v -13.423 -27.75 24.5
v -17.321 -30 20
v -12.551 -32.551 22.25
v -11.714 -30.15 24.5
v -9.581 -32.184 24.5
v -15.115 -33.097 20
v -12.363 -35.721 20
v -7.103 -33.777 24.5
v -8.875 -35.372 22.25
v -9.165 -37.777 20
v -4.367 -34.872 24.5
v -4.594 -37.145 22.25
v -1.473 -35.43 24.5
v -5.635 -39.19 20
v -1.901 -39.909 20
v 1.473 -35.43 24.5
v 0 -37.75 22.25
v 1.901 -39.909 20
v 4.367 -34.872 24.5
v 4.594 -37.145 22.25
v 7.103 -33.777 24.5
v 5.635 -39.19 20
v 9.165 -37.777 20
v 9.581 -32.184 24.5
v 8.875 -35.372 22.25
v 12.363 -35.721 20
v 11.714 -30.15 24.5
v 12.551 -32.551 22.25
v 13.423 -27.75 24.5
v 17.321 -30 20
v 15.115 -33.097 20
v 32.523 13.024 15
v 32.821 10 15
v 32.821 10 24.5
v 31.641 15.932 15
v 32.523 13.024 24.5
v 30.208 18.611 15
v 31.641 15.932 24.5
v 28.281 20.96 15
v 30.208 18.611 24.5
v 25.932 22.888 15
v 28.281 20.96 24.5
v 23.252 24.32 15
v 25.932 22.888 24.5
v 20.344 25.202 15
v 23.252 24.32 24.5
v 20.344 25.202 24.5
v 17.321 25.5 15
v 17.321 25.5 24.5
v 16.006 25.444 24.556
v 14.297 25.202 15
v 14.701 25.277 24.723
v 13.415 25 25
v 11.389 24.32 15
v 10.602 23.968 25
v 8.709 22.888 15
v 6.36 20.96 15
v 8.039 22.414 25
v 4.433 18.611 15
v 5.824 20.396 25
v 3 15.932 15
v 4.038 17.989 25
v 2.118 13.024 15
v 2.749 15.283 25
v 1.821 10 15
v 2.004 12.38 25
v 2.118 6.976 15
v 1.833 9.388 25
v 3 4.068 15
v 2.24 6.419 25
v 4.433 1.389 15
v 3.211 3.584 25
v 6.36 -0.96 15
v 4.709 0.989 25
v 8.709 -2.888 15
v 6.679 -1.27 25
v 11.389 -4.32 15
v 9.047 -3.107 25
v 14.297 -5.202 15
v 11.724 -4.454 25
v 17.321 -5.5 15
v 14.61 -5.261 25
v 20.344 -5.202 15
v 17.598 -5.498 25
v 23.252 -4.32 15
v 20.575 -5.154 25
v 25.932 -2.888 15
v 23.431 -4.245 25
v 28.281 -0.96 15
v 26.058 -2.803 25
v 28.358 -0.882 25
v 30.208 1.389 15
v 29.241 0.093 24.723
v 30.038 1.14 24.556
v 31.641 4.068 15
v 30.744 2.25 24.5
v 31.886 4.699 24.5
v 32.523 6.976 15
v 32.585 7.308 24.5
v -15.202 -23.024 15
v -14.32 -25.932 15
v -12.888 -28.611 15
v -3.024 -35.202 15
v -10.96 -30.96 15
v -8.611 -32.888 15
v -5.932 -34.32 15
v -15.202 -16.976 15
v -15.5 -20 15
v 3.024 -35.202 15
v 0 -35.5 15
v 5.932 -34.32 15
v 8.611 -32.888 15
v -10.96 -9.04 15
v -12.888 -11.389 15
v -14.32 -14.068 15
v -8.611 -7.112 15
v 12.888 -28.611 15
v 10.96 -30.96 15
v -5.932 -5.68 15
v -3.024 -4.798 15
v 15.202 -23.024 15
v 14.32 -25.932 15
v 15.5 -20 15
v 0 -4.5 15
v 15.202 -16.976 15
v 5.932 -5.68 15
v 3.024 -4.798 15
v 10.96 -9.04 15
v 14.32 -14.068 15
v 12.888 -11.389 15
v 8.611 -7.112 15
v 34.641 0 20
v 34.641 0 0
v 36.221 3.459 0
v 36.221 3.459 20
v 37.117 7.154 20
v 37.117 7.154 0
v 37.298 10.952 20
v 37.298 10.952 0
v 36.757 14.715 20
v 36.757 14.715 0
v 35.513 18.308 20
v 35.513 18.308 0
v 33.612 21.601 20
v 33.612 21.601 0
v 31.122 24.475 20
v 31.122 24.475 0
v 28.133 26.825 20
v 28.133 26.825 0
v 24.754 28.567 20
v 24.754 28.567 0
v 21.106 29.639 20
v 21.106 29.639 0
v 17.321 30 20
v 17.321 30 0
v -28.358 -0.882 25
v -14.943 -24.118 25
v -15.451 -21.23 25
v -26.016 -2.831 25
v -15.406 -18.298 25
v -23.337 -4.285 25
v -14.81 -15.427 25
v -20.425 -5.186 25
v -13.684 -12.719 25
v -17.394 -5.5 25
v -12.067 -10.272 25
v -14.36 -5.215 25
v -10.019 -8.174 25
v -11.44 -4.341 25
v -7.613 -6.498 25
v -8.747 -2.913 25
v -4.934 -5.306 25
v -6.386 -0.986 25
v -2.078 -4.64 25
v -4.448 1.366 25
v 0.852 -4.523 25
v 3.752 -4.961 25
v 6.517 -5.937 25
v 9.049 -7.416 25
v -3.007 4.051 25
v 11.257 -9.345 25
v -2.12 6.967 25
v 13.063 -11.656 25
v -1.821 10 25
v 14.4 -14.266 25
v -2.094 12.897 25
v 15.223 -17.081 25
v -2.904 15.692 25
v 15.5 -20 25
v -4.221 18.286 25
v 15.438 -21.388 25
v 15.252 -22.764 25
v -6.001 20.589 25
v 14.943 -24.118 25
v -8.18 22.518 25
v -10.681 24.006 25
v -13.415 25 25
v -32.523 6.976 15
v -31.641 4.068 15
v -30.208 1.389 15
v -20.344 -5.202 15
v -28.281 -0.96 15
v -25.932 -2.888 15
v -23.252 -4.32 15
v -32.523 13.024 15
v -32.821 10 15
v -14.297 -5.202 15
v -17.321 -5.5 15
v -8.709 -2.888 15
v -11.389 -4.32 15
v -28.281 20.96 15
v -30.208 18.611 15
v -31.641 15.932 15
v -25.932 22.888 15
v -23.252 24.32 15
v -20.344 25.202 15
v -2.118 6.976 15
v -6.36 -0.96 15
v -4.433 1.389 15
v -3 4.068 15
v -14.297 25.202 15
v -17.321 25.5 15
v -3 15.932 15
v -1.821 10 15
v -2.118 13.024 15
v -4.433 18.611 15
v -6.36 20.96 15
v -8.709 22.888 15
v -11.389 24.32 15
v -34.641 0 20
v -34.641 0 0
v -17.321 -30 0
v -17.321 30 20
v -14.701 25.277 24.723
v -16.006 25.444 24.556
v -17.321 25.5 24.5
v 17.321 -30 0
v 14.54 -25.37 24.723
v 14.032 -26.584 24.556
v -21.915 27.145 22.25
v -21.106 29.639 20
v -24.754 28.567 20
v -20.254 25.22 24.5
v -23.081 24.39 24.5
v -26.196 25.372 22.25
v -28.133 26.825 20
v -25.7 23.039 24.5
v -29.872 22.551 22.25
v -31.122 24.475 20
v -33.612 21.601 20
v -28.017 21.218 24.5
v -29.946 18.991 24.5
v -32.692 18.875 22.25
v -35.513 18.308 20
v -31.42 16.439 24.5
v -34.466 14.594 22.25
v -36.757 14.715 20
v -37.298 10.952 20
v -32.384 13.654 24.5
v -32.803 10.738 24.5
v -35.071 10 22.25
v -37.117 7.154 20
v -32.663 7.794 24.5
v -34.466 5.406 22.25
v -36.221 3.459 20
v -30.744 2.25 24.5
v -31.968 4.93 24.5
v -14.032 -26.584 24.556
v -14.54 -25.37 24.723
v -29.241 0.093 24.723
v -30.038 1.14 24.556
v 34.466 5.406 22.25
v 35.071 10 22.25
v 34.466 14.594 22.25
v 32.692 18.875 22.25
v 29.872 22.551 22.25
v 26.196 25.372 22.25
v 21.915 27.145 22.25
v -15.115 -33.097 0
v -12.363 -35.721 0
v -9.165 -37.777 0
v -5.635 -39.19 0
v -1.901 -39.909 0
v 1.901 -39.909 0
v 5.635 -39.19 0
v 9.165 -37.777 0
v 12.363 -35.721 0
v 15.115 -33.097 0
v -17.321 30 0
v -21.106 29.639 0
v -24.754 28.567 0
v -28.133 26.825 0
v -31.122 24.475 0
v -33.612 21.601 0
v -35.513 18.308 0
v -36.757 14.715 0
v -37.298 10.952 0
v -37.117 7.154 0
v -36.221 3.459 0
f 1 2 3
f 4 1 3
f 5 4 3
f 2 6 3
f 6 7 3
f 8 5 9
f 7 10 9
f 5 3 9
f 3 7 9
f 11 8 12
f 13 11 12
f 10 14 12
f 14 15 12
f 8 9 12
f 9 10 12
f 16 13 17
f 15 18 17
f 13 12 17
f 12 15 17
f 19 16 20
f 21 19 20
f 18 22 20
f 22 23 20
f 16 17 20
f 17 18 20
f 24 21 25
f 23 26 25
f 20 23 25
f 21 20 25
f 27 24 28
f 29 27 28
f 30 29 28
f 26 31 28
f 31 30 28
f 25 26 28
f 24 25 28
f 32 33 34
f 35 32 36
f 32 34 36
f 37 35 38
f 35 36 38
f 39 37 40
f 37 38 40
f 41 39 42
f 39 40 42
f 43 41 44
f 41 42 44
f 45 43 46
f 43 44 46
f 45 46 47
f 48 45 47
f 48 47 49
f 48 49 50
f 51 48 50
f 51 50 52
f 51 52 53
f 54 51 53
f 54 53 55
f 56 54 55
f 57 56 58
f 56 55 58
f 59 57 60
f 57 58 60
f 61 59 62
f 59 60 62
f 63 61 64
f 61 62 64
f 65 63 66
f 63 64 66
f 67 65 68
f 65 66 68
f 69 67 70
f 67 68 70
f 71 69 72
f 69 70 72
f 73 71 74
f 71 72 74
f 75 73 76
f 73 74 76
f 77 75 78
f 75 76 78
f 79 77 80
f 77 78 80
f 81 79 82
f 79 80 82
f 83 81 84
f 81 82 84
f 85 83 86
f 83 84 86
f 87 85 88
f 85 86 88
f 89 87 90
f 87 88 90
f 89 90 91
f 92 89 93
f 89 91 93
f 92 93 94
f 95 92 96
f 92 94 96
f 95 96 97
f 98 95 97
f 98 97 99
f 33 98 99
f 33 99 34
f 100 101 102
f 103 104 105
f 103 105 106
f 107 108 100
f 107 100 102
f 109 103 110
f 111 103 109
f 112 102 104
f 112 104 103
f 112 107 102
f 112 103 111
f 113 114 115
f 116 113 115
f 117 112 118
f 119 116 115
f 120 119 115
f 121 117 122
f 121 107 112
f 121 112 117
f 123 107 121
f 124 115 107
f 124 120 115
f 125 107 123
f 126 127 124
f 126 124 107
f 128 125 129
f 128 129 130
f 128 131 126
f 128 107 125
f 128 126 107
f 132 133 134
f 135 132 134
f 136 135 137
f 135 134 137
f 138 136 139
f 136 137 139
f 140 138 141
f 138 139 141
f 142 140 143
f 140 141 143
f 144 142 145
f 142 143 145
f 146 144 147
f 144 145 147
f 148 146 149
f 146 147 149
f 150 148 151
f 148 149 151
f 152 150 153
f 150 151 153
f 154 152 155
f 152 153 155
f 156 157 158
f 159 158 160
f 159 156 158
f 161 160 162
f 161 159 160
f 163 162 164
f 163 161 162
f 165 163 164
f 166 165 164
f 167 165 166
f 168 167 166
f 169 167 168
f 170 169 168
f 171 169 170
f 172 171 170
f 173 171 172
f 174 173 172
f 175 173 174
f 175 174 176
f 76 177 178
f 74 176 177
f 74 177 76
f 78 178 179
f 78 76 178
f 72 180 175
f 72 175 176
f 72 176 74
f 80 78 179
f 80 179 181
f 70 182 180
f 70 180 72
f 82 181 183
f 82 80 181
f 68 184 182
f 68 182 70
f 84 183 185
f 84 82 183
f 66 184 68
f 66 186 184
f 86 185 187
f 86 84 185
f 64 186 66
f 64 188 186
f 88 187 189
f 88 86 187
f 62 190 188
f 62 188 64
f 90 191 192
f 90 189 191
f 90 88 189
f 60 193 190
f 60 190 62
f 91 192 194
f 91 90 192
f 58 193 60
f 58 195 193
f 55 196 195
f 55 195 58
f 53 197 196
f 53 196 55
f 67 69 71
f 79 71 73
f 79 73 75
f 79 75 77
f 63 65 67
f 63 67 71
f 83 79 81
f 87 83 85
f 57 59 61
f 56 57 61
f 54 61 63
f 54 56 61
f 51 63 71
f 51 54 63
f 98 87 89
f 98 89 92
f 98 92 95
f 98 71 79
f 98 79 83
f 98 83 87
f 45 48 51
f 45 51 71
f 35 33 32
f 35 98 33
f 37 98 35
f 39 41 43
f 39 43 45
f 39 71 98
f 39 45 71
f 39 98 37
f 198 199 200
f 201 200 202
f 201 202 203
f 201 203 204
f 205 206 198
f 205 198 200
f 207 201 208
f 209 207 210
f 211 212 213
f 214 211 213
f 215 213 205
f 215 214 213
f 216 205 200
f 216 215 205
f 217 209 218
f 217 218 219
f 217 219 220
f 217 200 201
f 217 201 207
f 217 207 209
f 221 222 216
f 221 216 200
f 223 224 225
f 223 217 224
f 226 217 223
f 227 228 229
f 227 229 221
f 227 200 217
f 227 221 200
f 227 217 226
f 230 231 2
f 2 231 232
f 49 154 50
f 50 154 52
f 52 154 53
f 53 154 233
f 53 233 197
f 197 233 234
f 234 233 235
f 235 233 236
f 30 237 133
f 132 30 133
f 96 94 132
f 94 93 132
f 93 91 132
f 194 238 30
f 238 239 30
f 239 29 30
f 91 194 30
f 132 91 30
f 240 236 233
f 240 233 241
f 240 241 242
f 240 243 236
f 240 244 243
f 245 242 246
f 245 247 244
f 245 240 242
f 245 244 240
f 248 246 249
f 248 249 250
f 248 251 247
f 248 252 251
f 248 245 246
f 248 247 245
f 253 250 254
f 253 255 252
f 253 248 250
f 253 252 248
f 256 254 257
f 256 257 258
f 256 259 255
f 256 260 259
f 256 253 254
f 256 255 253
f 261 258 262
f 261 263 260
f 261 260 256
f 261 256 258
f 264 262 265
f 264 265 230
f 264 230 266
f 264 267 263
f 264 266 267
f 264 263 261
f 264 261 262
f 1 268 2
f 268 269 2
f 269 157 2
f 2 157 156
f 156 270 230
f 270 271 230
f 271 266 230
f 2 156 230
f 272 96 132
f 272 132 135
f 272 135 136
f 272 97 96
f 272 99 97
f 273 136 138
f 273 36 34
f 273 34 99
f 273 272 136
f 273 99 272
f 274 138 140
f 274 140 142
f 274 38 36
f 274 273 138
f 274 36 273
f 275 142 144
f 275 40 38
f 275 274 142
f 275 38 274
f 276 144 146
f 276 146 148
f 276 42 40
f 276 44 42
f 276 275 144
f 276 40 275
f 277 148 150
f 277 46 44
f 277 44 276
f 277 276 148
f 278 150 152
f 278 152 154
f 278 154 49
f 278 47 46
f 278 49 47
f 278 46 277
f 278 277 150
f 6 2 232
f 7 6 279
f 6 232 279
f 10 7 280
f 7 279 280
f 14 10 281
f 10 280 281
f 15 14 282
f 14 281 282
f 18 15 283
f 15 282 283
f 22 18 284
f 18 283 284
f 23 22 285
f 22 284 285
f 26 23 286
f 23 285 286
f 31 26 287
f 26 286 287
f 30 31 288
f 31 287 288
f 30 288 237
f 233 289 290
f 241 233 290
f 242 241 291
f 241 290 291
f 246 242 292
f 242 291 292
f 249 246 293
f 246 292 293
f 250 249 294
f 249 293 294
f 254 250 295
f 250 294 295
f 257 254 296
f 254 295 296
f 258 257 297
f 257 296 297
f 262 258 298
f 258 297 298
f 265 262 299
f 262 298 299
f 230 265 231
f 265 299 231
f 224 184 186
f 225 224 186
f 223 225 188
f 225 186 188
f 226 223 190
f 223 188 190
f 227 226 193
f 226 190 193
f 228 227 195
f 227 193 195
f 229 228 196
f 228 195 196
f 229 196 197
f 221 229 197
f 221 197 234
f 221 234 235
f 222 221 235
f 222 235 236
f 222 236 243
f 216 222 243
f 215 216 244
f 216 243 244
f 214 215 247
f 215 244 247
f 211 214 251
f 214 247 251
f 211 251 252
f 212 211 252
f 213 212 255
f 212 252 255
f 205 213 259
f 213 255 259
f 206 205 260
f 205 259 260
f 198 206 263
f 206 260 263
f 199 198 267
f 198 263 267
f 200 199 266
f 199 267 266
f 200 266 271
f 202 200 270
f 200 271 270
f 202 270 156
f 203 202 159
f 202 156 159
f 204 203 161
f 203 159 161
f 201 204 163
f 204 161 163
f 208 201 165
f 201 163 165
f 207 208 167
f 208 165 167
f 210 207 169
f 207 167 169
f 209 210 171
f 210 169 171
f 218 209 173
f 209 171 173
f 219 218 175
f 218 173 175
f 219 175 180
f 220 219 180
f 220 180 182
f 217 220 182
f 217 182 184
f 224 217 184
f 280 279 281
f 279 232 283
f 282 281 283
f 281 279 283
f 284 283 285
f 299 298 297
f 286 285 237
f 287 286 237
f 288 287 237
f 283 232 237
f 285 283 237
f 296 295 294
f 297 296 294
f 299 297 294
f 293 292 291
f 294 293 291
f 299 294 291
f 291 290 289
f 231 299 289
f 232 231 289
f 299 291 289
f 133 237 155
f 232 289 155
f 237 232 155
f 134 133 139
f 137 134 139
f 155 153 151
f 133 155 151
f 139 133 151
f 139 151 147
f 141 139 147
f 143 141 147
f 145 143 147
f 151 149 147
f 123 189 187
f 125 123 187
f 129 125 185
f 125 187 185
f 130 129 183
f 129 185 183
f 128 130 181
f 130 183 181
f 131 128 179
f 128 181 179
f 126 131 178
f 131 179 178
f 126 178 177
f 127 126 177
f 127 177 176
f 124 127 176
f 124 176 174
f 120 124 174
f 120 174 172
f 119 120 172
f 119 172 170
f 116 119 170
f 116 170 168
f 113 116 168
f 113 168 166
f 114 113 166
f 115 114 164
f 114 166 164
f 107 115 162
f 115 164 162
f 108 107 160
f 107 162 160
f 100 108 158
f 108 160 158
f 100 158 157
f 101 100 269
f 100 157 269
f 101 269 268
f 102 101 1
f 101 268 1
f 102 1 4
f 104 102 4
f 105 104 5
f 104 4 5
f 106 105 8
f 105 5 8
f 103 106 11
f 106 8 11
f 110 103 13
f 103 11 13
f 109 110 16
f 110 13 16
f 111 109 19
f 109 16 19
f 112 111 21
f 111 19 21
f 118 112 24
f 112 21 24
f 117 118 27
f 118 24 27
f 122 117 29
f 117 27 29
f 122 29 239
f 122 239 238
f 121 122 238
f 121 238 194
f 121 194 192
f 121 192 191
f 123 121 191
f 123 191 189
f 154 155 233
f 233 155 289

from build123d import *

# Parameters (mm, degrees)
F1_DEPTH     = 25
F2_R         = 15.5
F3_DEPTH     = 10
F4_T1_DEPTH  = 34.6410161514
F4_T3_DEPTH  = 34.6410161514
F4_T5_DEPTH  = 34.6410161514
F4_T8_ANGLE  = 120
F4_T10_ANGLE = 120
F4_T12_ANGLE = 120


# Not quite as in the source:
# - a fillet or chamfer that OpenCascade refuses, or shapes differently, is made with other operations: its cross-section is extruded or revolved along the edge and cut away or added


with BuildPart() as f1:
    # F0 (on Top) → F1 (new body)
    with BuildSketch(Plane.XY):
        with BuildLine():
            Line((17.3205080757, 30), (-17.3205080757, 30))
            ThreePointArc((-17.3205080757, 30), (-34.6410161514, 20), (-34.6410161514, 0))
            Line((-34.6410161514, 0), (-17.3205080757, -30))
            ThreePointArc((-17.3205080757, -30), (0, -40), (17.3205080757, -30))
            Line((17.3205080757, -30), (34.6410161514, 0))
            ThreePointArc((34.6410161514, 0), (34.6410161514, 20), (17.3205080757, 30))
        make_face()
    extrude(amount=F1_DEPTH)

    # F2 (on face) → F3 (cut)
    with BuildSketch(Plane.XY.offset(25)):
        with Locations((-17.3205080757, 10)):
            Circle(F2_R)
        with Locations((0, -20)):
            Circle(F2_R)
        with Locations((17.3205080757, 10)):
            Circle(F2_R)
    extrude(amount=-F3_DEPTH, mode=Mode.SUBTRACT)

    # F4: chamfer of 5 on 1 edges, made by hand

    # F4_s2 → F4_t1 (cut)
    with BuildSketch(Plane(origin=(-8.6602540378, -15, 0), x_dir=(0, 0, 1), z_dir=(0.5, 0.8660254038, 0))):
        Polygon((25, 25), (20, 30), (25, 30), align=None)
    extrude(amount=F4_T1_DEPTH, mode=Mode.SUBTRACT)

    # F4_s4 → F4_t3 (cut)
    with BuildSketch(Plane.YZ.offset(-17.3205080757)):
        Polygon((30, 20), (25, 25), (30, 25), align=None)
    extrude(amount=F4_T3_DEPTH, mode=Mode.SUBTRACT)

    # F4_s6 → F4_t5 (cut)
    with BuildSketch(Plane(origin=(-8.6602540378, 15, 0), x_dir=(0, 0, 1), z_dir=(0.5, -0.8660254038, 0))):
        Polygon((25, 25), (20, 30), (25, 30), align=None)
    extrude(amount=F4_T5_DEPTH, mode=Mode.SUBTRACT)

    # F4_s7 → F4_t8 (revolve, cut)
    with BuildSketch(Plane(origin=(8.6602540378, -15, 0), x_dir=(0, 0, 1), z_dir=(-0.5, 0.8660254038, 0))):
        Polygon((25, -25), (20, -30), (25, -30), align=None)
    revolve(axis=Axis((0, -20, 25), (0, 0, 1)), revolution_arc=F4_T8_ANGLE, mode=Mode.SUBTRACT)

    # F4_s9 → F4_t10 (revolve, cut)
    with BuildSketch(Plane(origin=(8.6602540378, 15, 0), x_dir=(0, 0, 1), z_dir=(-0.5, -0.8660254038, 0))):
        Polygon((20, -30), (25, -25), (25, -30), align=None)
    revolve(axis=Axis((17.3205080757, 10, 25), (0, 0, 1)), revolution_arc=F4_T10_ANGLE, mode=Mode.SUBTRACT)

    # F4_s11 → F4_t12 (revolve, cut)
    with BuildSketch(Plane.YZ.offset(-17.3205080757)):
        Polygon((30, 20), (25, 25), (30, 25), align=None)
    revolve(axis=Axis((-17.3205080757, 10, 25), (0, 0, 1)), revolution_arc=F4_T12_ANGLE, mode=Mode.SUBTRACT)


solid = f1.part
